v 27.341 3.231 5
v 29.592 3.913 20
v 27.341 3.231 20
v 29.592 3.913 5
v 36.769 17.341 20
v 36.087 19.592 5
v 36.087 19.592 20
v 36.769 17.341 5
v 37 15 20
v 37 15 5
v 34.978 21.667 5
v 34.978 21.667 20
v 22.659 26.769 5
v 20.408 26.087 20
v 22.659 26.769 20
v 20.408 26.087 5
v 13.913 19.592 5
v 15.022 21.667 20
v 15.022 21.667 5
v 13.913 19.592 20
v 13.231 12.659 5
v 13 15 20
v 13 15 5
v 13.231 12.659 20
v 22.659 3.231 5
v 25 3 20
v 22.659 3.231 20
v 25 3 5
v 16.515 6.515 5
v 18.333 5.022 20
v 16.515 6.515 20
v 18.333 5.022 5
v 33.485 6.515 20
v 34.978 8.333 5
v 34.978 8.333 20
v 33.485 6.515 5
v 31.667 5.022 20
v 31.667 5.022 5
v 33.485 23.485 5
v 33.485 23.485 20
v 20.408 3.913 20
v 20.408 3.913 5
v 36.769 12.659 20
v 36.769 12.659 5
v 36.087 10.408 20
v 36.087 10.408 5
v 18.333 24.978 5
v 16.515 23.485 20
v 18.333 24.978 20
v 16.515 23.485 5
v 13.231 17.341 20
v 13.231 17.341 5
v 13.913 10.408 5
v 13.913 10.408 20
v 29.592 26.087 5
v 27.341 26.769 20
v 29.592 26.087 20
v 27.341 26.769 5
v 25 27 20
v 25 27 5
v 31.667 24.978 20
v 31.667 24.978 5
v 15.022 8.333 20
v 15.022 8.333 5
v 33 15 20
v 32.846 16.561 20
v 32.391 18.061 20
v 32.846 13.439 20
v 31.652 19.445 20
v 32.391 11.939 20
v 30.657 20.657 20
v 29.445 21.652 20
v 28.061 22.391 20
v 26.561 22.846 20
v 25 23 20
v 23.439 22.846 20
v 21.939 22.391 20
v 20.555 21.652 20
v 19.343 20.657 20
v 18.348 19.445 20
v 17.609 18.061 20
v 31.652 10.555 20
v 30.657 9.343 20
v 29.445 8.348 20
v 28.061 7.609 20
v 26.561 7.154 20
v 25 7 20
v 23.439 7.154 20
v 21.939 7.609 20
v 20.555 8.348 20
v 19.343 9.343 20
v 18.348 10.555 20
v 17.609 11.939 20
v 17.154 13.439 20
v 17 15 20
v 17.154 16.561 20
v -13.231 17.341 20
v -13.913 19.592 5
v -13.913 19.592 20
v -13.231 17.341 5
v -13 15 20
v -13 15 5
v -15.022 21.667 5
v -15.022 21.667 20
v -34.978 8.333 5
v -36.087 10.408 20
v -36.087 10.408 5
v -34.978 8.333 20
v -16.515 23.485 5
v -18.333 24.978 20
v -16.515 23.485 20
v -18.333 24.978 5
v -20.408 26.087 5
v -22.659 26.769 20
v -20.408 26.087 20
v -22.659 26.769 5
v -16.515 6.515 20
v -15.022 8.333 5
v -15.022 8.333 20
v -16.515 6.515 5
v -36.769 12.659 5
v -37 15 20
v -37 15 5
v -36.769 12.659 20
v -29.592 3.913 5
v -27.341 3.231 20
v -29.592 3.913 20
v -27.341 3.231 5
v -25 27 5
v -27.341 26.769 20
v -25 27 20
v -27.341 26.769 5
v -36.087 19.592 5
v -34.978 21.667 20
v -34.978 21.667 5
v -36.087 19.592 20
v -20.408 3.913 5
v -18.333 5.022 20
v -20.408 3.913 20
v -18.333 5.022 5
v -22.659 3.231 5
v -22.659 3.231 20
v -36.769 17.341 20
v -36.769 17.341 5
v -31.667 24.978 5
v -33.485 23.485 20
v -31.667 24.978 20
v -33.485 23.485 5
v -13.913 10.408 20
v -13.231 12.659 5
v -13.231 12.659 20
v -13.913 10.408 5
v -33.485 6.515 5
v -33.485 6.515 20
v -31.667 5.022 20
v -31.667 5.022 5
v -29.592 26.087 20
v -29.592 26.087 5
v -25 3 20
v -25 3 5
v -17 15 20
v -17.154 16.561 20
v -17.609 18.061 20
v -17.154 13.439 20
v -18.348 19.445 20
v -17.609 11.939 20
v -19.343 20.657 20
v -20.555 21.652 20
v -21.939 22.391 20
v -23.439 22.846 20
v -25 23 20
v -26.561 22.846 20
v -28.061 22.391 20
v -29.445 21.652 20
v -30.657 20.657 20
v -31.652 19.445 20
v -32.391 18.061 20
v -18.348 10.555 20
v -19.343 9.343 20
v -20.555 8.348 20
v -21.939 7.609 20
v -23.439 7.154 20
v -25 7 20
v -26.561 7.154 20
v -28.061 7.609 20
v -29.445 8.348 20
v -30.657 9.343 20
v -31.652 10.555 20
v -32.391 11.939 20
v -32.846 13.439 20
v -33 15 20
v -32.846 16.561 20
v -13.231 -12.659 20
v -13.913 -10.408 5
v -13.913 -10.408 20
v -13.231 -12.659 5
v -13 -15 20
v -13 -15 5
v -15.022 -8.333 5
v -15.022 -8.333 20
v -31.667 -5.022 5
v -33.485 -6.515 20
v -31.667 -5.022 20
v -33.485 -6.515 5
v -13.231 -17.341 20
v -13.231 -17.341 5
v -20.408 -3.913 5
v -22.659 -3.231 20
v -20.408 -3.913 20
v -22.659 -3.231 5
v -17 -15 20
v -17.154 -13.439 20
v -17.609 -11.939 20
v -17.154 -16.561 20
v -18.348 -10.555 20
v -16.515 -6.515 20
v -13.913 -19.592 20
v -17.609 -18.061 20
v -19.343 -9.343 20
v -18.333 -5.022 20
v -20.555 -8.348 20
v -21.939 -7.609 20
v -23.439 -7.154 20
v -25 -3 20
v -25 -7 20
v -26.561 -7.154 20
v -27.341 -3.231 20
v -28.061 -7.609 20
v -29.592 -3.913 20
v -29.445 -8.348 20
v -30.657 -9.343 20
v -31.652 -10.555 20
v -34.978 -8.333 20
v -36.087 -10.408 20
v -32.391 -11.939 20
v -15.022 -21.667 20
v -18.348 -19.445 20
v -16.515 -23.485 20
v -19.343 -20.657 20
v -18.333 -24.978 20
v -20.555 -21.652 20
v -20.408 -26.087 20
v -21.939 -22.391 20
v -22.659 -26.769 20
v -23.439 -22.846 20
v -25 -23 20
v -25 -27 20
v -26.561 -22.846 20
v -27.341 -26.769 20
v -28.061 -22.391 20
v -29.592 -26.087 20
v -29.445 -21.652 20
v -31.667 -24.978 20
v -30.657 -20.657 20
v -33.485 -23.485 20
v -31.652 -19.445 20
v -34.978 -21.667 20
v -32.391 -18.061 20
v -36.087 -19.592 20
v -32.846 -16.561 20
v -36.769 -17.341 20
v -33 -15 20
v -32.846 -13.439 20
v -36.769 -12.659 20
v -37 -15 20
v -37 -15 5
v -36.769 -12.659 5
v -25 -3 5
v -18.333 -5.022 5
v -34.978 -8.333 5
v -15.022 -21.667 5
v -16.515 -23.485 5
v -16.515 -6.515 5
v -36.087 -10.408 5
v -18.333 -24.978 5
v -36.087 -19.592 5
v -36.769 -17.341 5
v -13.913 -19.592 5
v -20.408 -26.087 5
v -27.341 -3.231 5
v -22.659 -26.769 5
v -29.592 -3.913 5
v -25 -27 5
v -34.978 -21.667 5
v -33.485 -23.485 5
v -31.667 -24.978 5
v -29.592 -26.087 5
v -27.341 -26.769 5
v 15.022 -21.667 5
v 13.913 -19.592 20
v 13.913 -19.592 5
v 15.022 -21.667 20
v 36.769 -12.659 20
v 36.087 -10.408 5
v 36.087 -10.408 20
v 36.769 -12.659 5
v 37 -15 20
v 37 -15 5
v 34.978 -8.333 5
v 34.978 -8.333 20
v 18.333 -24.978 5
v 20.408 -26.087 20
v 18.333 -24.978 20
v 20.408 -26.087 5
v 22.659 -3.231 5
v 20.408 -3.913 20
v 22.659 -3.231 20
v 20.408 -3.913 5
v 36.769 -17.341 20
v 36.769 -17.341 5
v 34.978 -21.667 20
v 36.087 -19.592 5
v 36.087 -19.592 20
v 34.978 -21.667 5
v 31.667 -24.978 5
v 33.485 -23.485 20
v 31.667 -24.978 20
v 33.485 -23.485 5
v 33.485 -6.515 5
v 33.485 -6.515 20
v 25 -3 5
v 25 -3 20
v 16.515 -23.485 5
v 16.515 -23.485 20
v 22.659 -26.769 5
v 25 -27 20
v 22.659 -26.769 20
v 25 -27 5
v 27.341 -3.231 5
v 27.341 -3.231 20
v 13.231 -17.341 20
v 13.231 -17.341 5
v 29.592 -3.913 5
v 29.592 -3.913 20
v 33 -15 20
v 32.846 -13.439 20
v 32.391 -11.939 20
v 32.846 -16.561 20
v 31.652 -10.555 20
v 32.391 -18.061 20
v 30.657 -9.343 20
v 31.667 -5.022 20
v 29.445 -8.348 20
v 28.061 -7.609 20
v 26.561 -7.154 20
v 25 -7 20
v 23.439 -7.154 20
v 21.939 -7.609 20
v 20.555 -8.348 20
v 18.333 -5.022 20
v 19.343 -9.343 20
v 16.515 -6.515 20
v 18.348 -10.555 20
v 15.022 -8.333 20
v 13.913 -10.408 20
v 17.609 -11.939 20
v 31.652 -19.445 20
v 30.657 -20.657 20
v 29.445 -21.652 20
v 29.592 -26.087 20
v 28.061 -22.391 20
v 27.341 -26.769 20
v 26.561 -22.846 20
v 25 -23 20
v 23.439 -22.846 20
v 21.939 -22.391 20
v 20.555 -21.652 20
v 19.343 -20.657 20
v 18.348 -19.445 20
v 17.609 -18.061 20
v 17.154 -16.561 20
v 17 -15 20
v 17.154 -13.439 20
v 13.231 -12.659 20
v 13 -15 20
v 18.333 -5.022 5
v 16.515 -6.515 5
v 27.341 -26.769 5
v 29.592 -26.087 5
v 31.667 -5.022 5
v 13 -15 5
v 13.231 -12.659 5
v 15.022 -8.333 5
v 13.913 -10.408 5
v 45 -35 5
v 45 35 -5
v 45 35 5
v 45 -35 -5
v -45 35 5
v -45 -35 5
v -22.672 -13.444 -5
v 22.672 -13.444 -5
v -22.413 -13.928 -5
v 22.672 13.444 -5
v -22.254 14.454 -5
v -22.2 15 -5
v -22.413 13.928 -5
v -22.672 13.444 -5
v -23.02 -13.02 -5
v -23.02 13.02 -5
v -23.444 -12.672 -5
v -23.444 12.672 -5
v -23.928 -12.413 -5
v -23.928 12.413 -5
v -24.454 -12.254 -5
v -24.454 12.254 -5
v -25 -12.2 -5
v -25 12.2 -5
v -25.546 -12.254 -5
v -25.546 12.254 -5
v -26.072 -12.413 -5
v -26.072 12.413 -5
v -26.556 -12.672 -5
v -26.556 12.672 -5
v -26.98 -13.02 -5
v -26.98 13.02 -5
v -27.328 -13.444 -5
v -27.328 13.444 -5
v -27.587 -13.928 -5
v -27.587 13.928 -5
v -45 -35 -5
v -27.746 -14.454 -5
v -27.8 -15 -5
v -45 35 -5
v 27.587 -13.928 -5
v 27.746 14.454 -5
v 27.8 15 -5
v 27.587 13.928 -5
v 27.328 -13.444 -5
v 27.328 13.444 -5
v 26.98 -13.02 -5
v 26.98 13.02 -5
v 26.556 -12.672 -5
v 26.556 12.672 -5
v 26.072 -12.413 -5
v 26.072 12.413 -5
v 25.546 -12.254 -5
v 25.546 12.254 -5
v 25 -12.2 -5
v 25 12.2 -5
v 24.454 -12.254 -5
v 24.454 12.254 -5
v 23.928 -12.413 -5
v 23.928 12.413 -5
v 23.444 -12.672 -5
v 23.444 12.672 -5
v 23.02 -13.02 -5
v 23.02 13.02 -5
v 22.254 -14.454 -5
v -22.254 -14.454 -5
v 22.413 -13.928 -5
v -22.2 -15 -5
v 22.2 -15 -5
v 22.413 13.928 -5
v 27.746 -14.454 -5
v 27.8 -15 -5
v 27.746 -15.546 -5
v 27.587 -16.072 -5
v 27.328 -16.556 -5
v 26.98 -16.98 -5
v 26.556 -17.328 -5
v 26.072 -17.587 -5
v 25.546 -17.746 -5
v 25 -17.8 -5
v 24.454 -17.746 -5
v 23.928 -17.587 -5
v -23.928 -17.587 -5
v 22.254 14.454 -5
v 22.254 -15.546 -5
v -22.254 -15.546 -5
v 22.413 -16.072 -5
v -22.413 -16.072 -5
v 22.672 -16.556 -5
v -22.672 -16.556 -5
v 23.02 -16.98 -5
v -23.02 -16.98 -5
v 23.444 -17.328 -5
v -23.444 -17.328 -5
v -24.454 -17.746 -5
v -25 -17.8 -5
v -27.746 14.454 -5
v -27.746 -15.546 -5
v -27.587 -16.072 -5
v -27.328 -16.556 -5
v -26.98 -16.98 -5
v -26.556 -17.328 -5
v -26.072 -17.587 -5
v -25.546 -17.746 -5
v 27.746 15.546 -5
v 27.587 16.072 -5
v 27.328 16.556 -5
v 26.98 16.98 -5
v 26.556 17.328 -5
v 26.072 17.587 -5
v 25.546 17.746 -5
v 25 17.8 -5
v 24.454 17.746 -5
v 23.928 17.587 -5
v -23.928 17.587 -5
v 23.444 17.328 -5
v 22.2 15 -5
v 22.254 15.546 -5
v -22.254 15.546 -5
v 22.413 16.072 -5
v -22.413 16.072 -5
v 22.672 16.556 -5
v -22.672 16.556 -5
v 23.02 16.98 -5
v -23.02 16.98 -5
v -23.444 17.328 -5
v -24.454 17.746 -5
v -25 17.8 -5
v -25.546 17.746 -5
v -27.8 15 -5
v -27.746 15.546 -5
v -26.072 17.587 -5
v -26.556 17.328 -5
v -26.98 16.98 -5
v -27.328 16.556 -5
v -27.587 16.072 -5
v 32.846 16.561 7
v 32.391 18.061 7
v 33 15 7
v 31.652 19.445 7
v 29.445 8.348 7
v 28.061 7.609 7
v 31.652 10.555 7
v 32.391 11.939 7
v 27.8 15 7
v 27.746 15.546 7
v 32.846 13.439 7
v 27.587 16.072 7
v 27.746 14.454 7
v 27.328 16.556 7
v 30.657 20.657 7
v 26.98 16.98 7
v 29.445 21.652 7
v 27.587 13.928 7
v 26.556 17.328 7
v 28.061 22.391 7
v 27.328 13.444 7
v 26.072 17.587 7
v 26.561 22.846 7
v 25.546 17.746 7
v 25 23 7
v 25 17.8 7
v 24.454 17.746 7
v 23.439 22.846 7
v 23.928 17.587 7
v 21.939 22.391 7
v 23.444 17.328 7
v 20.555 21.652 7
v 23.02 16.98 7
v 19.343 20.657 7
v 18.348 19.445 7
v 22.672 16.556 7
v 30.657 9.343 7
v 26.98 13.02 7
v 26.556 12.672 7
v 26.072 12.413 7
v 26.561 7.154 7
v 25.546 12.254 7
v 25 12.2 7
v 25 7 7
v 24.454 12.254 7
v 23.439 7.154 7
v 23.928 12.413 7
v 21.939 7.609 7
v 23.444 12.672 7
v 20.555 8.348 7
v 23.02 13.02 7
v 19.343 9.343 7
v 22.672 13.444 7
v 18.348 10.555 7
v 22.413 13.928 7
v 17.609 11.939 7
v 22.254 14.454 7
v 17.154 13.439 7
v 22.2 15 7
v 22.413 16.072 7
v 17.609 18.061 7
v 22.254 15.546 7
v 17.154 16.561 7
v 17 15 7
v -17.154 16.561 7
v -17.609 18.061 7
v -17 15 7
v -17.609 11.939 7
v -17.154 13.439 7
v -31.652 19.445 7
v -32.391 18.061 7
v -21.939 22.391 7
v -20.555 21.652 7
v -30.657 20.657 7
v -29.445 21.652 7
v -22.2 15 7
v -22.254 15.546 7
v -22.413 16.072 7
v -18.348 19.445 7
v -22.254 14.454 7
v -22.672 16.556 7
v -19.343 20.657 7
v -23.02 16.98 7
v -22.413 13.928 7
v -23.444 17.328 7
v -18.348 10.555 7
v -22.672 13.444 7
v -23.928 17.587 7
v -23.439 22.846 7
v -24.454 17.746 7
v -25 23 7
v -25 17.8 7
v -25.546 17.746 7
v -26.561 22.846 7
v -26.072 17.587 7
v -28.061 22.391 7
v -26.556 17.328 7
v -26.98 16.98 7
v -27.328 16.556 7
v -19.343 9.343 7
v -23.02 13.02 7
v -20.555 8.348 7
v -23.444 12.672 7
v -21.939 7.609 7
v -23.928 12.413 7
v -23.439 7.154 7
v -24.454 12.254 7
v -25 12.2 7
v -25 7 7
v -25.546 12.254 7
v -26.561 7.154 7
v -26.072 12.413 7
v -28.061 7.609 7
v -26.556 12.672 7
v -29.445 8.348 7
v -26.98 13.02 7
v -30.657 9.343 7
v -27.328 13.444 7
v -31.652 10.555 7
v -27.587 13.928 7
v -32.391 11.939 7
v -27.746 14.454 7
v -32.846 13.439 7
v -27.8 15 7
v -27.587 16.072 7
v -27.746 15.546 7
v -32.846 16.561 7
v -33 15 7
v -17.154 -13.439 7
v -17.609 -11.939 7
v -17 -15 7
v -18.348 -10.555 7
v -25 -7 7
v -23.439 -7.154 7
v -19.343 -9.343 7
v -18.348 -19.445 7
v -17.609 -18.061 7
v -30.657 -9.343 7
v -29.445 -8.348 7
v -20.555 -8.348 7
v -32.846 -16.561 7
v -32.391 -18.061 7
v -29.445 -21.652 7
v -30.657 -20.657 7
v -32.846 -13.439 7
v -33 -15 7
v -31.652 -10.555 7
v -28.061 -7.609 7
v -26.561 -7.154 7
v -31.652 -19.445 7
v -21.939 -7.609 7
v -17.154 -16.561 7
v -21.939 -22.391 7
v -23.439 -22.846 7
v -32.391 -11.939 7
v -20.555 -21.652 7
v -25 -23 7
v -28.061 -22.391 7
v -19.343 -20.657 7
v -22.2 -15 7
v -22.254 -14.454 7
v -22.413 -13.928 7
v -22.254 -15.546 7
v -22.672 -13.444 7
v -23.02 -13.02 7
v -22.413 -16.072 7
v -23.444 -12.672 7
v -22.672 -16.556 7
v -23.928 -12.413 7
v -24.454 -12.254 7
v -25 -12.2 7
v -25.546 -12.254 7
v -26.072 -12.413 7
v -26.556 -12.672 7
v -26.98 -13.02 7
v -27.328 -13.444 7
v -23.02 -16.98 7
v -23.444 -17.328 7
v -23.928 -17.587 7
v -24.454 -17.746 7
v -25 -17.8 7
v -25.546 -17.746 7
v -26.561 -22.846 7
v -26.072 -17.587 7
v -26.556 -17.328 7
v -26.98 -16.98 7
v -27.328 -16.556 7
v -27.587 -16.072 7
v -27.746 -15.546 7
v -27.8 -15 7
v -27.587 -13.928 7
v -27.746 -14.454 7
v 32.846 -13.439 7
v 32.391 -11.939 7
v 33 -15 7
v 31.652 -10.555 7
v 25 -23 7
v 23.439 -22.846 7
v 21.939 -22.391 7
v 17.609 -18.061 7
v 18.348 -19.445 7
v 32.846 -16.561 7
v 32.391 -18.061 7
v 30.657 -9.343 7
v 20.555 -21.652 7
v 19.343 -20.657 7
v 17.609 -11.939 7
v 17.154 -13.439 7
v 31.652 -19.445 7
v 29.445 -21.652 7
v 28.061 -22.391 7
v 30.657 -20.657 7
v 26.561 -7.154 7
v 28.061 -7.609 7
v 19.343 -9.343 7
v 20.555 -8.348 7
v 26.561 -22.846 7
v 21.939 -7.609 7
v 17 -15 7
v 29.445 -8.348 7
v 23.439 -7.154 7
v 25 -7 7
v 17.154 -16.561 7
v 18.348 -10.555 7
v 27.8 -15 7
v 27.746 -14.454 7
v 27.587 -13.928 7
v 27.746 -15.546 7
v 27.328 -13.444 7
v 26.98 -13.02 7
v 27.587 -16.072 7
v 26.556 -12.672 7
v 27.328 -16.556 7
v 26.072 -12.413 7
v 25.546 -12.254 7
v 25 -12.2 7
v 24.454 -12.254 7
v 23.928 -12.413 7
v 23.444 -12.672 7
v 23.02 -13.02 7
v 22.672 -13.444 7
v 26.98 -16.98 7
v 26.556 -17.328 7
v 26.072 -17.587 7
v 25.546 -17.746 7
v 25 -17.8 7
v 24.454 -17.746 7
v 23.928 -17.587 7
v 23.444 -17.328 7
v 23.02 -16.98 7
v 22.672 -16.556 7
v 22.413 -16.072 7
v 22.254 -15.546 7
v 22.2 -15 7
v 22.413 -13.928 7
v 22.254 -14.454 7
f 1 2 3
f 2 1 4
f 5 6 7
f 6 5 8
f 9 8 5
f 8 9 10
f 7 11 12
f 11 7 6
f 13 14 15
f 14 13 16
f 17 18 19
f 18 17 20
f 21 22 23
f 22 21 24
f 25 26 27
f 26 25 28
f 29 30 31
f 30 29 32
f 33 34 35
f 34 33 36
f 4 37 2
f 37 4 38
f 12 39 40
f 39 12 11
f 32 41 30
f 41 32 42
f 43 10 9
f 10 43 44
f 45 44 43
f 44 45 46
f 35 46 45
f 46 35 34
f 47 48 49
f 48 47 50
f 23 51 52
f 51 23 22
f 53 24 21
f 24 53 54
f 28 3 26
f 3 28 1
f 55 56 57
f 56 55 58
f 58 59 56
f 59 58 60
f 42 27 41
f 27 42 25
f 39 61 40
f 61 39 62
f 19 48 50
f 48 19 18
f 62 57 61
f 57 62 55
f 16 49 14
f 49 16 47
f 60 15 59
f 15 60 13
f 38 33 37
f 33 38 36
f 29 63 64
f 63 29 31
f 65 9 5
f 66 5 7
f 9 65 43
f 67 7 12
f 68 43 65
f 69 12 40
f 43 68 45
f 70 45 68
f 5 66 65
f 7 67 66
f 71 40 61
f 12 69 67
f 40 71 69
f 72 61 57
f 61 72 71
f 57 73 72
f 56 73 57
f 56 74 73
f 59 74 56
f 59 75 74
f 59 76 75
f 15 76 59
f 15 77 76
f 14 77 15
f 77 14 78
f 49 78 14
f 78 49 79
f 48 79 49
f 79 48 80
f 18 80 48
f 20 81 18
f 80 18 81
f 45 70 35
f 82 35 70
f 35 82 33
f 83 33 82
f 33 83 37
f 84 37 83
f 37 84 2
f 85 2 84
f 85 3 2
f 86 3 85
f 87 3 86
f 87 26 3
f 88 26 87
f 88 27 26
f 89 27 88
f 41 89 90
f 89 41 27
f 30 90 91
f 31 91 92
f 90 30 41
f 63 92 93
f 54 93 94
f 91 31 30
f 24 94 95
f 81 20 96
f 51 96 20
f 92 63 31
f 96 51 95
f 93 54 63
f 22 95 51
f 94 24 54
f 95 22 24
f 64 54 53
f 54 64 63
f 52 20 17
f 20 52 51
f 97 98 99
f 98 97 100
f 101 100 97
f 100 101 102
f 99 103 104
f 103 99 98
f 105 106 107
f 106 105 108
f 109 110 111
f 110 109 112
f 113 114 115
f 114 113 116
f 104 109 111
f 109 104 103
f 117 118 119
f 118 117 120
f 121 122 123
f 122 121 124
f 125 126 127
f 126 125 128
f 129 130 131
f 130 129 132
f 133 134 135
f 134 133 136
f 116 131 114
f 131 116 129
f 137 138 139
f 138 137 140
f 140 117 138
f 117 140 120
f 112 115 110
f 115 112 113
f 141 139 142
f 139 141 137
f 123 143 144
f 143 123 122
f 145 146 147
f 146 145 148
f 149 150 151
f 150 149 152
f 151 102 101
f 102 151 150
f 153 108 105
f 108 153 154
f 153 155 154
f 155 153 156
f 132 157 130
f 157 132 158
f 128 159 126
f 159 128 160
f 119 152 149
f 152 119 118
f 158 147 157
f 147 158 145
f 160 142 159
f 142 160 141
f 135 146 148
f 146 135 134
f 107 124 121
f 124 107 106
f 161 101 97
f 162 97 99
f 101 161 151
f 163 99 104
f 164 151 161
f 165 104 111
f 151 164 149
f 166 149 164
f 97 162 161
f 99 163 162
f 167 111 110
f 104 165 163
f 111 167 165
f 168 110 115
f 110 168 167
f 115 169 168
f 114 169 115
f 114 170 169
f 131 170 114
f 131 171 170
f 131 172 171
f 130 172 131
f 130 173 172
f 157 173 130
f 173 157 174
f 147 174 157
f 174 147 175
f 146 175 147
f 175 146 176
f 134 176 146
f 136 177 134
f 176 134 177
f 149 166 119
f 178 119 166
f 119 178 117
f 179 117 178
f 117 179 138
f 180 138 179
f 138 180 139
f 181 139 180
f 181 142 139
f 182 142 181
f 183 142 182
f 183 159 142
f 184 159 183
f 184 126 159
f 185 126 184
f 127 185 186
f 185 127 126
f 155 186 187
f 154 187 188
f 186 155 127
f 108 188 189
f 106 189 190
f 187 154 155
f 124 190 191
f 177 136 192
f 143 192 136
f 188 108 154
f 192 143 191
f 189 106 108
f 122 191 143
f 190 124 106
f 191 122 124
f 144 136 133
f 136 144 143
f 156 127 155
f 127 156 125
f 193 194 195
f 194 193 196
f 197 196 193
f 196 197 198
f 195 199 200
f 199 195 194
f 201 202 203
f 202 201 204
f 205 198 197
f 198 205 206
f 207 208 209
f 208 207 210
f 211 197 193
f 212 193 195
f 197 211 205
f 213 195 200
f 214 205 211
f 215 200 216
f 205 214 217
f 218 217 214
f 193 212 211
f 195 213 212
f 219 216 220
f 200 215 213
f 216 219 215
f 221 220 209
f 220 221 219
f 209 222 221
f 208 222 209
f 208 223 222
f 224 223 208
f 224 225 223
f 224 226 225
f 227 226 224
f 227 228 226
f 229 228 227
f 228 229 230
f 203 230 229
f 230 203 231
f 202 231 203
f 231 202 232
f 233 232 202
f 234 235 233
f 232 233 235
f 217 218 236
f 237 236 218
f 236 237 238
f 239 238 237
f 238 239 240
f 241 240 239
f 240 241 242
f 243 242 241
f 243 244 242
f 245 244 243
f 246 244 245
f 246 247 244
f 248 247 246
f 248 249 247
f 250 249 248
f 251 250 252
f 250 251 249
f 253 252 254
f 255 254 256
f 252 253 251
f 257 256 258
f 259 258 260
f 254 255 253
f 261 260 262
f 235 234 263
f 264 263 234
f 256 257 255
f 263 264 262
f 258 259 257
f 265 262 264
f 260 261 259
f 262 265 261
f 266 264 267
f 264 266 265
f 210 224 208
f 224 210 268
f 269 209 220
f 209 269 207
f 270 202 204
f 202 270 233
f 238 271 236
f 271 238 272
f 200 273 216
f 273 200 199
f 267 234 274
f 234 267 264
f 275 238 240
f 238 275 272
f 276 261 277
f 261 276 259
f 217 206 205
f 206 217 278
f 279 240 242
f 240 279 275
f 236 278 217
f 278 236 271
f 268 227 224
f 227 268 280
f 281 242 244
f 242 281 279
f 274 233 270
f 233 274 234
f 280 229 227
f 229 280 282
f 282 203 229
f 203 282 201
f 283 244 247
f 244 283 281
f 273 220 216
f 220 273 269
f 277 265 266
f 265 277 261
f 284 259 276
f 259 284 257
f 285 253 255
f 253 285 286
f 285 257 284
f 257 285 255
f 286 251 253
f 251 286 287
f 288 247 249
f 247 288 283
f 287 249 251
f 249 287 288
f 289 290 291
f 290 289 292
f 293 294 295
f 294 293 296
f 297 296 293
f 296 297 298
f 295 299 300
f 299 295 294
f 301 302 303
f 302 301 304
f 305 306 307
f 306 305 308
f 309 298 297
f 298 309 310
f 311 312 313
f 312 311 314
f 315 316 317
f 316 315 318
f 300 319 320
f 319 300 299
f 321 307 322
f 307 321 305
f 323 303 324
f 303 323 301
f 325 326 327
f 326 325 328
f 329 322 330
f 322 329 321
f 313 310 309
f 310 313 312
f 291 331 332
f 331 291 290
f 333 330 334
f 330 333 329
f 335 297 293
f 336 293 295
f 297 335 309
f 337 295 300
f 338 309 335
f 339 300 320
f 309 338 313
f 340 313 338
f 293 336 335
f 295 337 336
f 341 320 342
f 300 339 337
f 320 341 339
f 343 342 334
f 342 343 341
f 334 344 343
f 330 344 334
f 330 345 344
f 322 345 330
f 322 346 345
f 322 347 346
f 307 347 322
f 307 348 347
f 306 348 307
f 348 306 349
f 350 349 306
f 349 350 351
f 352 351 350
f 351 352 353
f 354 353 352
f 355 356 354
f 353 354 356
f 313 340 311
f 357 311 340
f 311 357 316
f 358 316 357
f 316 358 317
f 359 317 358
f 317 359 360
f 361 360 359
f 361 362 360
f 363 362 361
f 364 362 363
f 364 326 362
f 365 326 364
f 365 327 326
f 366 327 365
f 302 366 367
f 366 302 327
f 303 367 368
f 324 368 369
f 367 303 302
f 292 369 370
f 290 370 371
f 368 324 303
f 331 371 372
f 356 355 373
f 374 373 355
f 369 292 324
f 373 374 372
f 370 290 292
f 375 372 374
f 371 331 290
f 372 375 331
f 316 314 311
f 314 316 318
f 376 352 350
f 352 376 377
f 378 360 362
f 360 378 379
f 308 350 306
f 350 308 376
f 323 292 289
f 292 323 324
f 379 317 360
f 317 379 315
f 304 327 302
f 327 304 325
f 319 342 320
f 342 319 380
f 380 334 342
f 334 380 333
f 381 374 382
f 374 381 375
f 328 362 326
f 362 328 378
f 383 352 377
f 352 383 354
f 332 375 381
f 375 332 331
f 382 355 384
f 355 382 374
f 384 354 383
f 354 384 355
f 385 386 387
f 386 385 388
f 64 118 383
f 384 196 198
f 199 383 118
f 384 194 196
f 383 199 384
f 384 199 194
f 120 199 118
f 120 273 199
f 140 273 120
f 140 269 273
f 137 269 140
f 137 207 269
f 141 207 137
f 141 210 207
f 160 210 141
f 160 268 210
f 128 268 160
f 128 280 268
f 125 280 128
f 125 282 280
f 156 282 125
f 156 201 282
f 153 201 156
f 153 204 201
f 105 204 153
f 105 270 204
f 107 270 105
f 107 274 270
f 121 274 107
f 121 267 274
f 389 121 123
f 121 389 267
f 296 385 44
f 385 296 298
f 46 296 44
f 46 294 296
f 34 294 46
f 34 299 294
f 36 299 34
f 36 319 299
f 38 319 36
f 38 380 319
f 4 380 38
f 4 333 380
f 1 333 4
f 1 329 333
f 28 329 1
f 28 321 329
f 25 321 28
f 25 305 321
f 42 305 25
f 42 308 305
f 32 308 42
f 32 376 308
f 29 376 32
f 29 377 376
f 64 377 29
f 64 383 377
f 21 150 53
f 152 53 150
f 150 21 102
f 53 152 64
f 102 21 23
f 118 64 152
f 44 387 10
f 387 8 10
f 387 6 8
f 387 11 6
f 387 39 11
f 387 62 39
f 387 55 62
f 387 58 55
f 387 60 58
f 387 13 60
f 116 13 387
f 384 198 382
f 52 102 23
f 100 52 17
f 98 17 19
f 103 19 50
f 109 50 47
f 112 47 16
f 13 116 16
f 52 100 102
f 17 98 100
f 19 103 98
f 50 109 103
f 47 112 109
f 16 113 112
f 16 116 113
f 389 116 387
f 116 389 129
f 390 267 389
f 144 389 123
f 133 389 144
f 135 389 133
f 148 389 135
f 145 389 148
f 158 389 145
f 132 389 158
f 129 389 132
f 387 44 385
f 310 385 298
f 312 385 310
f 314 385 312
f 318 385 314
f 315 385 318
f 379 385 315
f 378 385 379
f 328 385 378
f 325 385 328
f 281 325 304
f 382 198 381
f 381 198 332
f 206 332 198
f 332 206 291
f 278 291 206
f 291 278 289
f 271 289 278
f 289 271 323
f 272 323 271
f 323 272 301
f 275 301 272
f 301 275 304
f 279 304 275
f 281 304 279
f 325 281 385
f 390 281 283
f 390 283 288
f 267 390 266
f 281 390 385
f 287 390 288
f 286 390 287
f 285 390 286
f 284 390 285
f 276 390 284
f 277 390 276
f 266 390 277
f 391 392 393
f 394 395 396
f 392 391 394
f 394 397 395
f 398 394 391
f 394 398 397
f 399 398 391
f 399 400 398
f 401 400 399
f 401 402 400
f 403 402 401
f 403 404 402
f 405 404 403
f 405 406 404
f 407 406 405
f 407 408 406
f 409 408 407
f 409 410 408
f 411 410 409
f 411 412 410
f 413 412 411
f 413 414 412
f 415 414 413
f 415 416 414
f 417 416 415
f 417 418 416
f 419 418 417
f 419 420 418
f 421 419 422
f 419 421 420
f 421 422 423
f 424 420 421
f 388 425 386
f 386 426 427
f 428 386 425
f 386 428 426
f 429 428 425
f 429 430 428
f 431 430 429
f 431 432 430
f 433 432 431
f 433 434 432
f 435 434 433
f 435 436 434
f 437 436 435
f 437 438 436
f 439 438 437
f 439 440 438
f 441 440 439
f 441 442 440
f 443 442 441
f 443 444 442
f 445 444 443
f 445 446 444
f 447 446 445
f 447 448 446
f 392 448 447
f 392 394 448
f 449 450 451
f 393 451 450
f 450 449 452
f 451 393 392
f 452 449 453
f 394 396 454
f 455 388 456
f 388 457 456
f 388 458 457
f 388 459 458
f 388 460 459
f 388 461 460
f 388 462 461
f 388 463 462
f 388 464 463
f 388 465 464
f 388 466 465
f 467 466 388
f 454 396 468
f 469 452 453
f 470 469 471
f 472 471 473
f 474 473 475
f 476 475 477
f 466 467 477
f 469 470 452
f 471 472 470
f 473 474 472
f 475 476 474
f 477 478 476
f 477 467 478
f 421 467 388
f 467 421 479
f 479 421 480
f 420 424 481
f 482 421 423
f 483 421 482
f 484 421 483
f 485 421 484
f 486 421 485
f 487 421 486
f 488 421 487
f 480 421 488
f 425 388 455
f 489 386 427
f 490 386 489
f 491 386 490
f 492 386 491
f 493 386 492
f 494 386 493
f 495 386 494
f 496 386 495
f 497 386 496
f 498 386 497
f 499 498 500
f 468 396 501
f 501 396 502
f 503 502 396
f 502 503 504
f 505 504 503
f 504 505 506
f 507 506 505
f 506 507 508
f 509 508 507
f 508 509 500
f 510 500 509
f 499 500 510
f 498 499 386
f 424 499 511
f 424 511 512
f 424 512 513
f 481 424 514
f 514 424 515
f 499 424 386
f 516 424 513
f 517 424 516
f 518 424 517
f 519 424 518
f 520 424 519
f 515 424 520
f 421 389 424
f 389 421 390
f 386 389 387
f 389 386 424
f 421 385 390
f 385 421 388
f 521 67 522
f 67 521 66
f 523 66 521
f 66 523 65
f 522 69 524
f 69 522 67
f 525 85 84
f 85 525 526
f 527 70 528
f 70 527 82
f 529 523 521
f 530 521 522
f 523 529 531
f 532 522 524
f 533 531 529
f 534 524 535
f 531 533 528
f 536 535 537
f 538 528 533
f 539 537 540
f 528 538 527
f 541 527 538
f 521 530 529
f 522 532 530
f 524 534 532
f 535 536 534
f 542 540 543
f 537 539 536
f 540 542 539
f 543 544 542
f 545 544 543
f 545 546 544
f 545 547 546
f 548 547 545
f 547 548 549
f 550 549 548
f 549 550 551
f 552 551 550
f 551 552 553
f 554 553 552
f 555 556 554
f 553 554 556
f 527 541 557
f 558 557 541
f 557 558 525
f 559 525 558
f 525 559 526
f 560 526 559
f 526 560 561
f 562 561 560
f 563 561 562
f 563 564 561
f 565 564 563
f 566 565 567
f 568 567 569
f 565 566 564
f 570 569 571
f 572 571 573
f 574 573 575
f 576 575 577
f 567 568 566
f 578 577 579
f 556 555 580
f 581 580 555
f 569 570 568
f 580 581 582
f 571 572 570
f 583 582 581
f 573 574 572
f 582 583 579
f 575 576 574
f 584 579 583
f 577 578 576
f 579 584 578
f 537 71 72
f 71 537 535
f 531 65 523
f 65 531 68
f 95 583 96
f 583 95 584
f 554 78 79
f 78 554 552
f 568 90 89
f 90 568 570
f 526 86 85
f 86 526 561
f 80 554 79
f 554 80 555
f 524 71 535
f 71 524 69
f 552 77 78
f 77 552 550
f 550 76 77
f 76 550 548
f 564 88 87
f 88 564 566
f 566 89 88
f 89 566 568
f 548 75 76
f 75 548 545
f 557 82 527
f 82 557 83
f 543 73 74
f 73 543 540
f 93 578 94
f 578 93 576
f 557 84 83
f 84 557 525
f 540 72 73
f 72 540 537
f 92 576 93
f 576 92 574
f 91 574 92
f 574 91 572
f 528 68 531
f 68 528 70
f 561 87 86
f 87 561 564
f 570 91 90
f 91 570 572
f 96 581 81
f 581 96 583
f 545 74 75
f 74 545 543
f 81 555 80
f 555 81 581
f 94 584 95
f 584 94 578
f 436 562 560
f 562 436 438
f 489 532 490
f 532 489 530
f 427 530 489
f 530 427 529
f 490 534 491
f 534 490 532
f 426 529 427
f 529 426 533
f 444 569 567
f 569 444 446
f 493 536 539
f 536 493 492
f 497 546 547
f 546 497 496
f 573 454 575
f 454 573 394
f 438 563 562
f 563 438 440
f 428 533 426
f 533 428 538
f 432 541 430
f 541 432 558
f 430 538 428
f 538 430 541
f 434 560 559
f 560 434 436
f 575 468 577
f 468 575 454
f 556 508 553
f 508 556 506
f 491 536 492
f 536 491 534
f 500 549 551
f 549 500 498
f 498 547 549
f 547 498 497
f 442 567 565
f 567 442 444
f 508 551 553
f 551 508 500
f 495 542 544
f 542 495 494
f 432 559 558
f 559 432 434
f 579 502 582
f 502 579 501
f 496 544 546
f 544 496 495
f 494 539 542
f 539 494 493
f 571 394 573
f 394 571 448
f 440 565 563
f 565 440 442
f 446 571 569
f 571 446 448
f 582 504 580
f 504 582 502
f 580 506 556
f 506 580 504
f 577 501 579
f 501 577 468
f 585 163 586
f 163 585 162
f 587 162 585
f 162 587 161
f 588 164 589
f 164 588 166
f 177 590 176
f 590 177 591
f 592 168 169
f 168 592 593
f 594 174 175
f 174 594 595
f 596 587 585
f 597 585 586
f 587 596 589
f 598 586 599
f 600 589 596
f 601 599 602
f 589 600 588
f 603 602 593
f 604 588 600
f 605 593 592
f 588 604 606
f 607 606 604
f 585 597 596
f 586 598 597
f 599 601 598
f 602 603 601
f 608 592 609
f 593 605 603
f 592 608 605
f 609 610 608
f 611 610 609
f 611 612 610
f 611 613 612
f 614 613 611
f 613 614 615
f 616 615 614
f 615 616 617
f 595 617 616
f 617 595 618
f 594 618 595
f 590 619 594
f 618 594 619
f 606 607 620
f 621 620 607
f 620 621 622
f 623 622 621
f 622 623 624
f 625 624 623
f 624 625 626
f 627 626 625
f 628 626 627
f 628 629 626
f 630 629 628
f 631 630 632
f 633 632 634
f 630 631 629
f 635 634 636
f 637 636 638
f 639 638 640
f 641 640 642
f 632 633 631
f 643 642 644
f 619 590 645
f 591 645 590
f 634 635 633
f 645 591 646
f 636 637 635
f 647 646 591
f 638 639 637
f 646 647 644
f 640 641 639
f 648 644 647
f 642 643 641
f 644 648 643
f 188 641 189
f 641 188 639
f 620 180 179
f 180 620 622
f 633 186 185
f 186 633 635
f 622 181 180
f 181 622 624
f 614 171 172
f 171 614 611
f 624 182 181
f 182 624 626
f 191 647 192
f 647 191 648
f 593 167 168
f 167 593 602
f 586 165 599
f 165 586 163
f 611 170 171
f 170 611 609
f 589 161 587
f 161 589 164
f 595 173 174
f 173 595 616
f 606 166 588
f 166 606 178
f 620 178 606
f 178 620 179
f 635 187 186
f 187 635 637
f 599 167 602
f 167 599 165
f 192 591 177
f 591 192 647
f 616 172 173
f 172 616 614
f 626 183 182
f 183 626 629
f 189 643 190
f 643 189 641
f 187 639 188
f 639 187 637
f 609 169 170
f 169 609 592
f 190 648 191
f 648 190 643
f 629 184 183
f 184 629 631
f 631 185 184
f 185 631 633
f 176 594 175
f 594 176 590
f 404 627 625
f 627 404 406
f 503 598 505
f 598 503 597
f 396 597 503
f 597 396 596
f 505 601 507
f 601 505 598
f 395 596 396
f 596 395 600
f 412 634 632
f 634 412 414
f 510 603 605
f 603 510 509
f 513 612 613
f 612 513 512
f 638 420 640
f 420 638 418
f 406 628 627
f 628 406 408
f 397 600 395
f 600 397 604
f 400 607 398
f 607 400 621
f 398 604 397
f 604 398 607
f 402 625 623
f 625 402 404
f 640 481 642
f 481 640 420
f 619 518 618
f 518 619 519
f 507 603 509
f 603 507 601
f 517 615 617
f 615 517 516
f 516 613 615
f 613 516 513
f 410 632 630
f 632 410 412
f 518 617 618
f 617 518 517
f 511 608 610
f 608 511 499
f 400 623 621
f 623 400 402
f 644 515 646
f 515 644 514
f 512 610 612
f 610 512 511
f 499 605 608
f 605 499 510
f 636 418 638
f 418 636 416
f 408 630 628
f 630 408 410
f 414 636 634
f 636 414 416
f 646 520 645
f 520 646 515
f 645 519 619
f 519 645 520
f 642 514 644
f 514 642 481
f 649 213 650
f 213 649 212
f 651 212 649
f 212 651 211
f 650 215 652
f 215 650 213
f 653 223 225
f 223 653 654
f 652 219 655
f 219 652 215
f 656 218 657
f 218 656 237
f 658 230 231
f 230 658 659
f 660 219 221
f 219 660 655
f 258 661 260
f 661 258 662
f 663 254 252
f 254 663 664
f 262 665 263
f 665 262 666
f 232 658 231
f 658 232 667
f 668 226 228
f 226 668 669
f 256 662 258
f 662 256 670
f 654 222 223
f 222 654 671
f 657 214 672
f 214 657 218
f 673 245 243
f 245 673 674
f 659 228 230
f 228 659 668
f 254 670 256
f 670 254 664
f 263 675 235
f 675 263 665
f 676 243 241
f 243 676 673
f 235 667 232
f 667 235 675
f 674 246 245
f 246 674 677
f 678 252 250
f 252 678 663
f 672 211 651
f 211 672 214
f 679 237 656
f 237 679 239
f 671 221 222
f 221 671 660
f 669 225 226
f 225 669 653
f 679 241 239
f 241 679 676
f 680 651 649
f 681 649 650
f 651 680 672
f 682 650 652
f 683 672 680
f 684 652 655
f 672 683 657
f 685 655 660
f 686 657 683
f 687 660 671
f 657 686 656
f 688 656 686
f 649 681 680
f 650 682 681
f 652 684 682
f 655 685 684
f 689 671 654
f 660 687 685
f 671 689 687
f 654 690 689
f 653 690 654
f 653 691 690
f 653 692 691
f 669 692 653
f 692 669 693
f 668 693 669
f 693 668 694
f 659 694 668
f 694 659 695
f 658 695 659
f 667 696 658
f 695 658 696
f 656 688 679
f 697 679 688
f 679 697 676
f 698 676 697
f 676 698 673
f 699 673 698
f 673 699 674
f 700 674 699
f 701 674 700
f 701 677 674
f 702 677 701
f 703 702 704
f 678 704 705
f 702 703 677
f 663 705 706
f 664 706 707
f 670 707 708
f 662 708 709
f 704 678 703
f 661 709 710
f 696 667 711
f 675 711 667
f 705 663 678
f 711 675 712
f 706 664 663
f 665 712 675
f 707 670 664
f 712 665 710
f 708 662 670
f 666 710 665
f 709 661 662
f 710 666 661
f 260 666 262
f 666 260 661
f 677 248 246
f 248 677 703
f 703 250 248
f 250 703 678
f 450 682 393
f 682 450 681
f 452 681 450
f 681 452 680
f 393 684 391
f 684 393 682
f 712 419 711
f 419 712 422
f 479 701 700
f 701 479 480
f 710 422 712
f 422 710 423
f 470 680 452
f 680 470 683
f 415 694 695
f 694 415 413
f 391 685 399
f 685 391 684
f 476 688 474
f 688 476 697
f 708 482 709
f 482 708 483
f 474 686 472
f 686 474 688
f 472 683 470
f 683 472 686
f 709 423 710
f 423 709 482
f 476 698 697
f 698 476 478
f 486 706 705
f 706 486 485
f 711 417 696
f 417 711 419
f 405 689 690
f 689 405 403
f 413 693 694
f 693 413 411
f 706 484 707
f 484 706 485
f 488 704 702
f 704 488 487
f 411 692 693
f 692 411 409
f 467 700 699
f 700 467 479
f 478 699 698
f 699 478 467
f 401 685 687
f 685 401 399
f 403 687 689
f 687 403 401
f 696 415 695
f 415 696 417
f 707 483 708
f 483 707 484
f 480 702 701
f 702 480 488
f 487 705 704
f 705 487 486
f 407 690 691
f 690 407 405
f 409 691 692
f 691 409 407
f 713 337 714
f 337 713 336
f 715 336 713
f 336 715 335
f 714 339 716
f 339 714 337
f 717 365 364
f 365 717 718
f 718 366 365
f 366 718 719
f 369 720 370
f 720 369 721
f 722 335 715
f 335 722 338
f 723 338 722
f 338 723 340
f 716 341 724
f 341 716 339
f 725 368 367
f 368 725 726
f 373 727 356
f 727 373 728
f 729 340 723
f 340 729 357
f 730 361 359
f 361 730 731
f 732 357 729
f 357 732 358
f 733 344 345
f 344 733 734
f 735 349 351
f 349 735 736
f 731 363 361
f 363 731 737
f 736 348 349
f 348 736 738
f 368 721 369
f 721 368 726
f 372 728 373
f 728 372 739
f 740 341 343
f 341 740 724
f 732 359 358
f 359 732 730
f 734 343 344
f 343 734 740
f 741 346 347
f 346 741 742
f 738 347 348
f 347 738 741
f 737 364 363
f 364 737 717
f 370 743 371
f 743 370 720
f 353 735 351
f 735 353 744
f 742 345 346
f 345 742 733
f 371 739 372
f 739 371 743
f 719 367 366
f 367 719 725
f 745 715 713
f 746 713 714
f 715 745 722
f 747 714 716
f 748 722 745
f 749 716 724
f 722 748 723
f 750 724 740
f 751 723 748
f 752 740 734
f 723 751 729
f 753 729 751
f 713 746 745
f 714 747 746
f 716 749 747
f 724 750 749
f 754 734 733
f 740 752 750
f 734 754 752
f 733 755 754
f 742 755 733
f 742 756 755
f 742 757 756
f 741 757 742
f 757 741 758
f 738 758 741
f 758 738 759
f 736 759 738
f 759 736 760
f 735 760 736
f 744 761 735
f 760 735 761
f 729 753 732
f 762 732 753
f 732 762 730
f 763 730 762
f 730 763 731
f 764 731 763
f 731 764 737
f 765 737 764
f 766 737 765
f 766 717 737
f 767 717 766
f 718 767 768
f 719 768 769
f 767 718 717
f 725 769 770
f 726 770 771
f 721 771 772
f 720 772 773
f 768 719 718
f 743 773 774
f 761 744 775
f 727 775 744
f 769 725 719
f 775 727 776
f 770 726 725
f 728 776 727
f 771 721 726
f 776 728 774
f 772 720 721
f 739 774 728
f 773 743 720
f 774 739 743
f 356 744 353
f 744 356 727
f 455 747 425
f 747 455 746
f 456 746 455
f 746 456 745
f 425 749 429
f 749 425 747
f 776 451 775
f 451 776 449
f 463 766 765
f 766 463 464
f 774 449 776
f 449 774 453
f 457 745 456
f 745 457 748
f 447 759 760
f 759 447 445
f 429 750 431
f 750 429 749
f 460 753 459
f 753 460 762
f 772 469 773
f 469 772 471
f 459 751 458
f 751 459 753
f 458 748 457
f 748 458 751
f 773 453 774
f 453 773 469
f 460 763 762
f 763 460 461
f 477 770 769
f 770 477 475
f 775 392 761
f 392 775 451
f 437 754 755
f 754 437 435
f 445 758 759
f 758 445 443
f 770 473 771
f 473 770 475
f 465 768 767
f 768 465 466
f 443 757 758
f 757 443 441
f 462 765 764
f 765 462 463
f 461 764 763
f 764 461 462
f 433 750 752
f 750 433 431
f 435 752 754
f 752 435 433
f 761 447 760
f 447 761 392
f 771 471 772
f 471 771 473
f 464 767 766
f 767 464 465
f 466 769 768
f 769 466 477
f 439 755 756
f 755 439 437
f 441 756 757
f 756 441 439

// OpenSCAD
$fn = 32;

// ----------------------------------------------------------------------
// Socket pad plate
// bosses with counterbored sockets for the screws
// ----------------------------------------------------------------------

// --- parameters (mm) ---
base_t = 10;           // base plate thickness
boss_h = 15;           // boss height above the base plate
boss_d = 24;           // boss diameter
socket_d = 16;         // socket diameter
socket_depth = 13;     // socket depth from the boss face
bolt_d = 5.6;          // screw clearance hole through the socket floor
plate = [90, 70, 10];  // overall size (x, y, z)
edge = 20;             // boss centre offset from the plate edge
pads = 4;              // boss count, one per corner

// --- derived feature positions (mm) ---
height = base_t + boss_h;        // = 25   overall height of the part
corner_x = plate[0] / 2 - edge;  // = 25   boss centre X
corner_y = plate[1] / 2 - edge;  // = 15   boss centre Y
feature_centers = [
  [corner_x, corner_y],
  [-corner_x, corner_y],
  [-corner_x, -corner_y],
  [corner_x, -corner_y]
];   // boss centres: sockets, holes and the pads themselves are placed from here

// base plate, bosses on feature_centers, socket + through hole in each
difference() {
  union() {
    cube(plate, center = true);
    for (centre = feature_centers)
      translate([centre[0], centre[1], plate[2] / 2 - 1])
        cylinder(d = boss_d, h = boss_h + 1);
  }
  for (centre = feature_centers) {
    translate([centre[0], centre[1], plate[2] / 2 + boss_h - socket_depth])
      cylinder(d = socket_d, h = socket_depth + 1);
    translate([centre[0], centre[1], -height])
      cylinder(d = bolt_d, h = 2 * height + 2);  // through the socket floor
  }
}
